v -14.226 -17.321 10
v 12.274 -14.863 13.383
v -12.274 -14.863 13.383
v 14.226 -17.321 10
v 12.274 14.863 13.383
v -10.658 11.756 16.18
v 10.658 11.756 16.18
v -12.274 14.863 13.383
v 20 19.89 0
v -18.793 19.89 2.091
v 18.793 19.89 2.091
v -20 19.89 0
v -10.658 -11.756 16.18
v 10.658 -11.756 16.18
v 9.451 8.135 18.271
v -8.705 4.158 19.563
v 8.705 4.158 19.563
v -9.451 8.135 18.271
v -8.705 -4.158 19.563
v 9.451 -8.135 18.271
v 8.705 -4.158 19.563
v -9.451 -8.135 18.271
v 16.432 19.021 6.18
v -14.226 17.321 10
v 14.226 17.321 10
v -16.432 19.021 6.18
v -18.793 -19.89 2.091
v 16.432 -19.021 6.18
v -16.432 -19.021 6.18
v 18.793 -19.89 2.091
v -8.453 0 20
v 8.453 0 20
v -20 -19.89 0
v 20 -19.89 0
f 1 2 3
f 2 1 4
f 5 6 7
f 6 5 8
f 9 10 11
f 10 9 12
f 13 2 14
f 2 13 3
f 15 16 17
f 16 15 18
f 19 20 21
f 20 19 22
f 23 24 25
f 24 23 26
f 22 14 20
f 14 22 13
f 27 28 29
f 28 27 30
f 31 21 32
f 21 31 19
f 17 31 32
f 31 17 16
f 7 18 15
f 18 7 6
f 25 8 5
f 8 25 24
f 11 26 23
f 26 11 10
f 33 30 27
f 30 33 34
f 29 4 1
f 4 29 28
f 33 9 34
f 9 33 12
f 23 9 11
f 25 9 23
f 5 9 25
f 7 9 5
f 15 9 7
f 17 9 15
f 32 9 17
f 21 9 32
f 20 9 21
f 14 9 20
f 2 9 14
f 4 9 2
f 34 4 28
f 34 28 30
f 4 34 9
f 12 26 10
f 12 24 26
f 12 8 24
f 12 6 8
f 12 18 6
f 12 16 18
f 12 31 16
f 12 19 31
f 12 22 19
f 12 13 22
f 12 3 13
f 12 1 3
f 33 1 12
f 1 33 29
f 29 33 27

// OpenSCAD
//equivalent scripts for this example
//resize([30,10])circle(d=20);

angle=-30;
echo(cos(angle));
//a=1/sin(angle);
//b=1;
r=20;
d=2*r;
h=d;
difference() {
translate([-h/2,0,0]) rotate([0,90.0])cylinder(r=r,h);
translate([-h,-h,-r])cube([2*h,2*h,r]);
translate([h/2,-r,0])rotate([0,angle,0])cube([d,d,d]);
#translate([-h/2,r,0])rotate([0,angle,180])cube([d,d,d]);
}

*translate([0,-r,0])color("pink",.5)square(2*r) ;
*scale([a,b])circle(r);
*color("green",.5)
*translate([0,0,-5])
*scale([a,b*PI/2])
*circle(r);
